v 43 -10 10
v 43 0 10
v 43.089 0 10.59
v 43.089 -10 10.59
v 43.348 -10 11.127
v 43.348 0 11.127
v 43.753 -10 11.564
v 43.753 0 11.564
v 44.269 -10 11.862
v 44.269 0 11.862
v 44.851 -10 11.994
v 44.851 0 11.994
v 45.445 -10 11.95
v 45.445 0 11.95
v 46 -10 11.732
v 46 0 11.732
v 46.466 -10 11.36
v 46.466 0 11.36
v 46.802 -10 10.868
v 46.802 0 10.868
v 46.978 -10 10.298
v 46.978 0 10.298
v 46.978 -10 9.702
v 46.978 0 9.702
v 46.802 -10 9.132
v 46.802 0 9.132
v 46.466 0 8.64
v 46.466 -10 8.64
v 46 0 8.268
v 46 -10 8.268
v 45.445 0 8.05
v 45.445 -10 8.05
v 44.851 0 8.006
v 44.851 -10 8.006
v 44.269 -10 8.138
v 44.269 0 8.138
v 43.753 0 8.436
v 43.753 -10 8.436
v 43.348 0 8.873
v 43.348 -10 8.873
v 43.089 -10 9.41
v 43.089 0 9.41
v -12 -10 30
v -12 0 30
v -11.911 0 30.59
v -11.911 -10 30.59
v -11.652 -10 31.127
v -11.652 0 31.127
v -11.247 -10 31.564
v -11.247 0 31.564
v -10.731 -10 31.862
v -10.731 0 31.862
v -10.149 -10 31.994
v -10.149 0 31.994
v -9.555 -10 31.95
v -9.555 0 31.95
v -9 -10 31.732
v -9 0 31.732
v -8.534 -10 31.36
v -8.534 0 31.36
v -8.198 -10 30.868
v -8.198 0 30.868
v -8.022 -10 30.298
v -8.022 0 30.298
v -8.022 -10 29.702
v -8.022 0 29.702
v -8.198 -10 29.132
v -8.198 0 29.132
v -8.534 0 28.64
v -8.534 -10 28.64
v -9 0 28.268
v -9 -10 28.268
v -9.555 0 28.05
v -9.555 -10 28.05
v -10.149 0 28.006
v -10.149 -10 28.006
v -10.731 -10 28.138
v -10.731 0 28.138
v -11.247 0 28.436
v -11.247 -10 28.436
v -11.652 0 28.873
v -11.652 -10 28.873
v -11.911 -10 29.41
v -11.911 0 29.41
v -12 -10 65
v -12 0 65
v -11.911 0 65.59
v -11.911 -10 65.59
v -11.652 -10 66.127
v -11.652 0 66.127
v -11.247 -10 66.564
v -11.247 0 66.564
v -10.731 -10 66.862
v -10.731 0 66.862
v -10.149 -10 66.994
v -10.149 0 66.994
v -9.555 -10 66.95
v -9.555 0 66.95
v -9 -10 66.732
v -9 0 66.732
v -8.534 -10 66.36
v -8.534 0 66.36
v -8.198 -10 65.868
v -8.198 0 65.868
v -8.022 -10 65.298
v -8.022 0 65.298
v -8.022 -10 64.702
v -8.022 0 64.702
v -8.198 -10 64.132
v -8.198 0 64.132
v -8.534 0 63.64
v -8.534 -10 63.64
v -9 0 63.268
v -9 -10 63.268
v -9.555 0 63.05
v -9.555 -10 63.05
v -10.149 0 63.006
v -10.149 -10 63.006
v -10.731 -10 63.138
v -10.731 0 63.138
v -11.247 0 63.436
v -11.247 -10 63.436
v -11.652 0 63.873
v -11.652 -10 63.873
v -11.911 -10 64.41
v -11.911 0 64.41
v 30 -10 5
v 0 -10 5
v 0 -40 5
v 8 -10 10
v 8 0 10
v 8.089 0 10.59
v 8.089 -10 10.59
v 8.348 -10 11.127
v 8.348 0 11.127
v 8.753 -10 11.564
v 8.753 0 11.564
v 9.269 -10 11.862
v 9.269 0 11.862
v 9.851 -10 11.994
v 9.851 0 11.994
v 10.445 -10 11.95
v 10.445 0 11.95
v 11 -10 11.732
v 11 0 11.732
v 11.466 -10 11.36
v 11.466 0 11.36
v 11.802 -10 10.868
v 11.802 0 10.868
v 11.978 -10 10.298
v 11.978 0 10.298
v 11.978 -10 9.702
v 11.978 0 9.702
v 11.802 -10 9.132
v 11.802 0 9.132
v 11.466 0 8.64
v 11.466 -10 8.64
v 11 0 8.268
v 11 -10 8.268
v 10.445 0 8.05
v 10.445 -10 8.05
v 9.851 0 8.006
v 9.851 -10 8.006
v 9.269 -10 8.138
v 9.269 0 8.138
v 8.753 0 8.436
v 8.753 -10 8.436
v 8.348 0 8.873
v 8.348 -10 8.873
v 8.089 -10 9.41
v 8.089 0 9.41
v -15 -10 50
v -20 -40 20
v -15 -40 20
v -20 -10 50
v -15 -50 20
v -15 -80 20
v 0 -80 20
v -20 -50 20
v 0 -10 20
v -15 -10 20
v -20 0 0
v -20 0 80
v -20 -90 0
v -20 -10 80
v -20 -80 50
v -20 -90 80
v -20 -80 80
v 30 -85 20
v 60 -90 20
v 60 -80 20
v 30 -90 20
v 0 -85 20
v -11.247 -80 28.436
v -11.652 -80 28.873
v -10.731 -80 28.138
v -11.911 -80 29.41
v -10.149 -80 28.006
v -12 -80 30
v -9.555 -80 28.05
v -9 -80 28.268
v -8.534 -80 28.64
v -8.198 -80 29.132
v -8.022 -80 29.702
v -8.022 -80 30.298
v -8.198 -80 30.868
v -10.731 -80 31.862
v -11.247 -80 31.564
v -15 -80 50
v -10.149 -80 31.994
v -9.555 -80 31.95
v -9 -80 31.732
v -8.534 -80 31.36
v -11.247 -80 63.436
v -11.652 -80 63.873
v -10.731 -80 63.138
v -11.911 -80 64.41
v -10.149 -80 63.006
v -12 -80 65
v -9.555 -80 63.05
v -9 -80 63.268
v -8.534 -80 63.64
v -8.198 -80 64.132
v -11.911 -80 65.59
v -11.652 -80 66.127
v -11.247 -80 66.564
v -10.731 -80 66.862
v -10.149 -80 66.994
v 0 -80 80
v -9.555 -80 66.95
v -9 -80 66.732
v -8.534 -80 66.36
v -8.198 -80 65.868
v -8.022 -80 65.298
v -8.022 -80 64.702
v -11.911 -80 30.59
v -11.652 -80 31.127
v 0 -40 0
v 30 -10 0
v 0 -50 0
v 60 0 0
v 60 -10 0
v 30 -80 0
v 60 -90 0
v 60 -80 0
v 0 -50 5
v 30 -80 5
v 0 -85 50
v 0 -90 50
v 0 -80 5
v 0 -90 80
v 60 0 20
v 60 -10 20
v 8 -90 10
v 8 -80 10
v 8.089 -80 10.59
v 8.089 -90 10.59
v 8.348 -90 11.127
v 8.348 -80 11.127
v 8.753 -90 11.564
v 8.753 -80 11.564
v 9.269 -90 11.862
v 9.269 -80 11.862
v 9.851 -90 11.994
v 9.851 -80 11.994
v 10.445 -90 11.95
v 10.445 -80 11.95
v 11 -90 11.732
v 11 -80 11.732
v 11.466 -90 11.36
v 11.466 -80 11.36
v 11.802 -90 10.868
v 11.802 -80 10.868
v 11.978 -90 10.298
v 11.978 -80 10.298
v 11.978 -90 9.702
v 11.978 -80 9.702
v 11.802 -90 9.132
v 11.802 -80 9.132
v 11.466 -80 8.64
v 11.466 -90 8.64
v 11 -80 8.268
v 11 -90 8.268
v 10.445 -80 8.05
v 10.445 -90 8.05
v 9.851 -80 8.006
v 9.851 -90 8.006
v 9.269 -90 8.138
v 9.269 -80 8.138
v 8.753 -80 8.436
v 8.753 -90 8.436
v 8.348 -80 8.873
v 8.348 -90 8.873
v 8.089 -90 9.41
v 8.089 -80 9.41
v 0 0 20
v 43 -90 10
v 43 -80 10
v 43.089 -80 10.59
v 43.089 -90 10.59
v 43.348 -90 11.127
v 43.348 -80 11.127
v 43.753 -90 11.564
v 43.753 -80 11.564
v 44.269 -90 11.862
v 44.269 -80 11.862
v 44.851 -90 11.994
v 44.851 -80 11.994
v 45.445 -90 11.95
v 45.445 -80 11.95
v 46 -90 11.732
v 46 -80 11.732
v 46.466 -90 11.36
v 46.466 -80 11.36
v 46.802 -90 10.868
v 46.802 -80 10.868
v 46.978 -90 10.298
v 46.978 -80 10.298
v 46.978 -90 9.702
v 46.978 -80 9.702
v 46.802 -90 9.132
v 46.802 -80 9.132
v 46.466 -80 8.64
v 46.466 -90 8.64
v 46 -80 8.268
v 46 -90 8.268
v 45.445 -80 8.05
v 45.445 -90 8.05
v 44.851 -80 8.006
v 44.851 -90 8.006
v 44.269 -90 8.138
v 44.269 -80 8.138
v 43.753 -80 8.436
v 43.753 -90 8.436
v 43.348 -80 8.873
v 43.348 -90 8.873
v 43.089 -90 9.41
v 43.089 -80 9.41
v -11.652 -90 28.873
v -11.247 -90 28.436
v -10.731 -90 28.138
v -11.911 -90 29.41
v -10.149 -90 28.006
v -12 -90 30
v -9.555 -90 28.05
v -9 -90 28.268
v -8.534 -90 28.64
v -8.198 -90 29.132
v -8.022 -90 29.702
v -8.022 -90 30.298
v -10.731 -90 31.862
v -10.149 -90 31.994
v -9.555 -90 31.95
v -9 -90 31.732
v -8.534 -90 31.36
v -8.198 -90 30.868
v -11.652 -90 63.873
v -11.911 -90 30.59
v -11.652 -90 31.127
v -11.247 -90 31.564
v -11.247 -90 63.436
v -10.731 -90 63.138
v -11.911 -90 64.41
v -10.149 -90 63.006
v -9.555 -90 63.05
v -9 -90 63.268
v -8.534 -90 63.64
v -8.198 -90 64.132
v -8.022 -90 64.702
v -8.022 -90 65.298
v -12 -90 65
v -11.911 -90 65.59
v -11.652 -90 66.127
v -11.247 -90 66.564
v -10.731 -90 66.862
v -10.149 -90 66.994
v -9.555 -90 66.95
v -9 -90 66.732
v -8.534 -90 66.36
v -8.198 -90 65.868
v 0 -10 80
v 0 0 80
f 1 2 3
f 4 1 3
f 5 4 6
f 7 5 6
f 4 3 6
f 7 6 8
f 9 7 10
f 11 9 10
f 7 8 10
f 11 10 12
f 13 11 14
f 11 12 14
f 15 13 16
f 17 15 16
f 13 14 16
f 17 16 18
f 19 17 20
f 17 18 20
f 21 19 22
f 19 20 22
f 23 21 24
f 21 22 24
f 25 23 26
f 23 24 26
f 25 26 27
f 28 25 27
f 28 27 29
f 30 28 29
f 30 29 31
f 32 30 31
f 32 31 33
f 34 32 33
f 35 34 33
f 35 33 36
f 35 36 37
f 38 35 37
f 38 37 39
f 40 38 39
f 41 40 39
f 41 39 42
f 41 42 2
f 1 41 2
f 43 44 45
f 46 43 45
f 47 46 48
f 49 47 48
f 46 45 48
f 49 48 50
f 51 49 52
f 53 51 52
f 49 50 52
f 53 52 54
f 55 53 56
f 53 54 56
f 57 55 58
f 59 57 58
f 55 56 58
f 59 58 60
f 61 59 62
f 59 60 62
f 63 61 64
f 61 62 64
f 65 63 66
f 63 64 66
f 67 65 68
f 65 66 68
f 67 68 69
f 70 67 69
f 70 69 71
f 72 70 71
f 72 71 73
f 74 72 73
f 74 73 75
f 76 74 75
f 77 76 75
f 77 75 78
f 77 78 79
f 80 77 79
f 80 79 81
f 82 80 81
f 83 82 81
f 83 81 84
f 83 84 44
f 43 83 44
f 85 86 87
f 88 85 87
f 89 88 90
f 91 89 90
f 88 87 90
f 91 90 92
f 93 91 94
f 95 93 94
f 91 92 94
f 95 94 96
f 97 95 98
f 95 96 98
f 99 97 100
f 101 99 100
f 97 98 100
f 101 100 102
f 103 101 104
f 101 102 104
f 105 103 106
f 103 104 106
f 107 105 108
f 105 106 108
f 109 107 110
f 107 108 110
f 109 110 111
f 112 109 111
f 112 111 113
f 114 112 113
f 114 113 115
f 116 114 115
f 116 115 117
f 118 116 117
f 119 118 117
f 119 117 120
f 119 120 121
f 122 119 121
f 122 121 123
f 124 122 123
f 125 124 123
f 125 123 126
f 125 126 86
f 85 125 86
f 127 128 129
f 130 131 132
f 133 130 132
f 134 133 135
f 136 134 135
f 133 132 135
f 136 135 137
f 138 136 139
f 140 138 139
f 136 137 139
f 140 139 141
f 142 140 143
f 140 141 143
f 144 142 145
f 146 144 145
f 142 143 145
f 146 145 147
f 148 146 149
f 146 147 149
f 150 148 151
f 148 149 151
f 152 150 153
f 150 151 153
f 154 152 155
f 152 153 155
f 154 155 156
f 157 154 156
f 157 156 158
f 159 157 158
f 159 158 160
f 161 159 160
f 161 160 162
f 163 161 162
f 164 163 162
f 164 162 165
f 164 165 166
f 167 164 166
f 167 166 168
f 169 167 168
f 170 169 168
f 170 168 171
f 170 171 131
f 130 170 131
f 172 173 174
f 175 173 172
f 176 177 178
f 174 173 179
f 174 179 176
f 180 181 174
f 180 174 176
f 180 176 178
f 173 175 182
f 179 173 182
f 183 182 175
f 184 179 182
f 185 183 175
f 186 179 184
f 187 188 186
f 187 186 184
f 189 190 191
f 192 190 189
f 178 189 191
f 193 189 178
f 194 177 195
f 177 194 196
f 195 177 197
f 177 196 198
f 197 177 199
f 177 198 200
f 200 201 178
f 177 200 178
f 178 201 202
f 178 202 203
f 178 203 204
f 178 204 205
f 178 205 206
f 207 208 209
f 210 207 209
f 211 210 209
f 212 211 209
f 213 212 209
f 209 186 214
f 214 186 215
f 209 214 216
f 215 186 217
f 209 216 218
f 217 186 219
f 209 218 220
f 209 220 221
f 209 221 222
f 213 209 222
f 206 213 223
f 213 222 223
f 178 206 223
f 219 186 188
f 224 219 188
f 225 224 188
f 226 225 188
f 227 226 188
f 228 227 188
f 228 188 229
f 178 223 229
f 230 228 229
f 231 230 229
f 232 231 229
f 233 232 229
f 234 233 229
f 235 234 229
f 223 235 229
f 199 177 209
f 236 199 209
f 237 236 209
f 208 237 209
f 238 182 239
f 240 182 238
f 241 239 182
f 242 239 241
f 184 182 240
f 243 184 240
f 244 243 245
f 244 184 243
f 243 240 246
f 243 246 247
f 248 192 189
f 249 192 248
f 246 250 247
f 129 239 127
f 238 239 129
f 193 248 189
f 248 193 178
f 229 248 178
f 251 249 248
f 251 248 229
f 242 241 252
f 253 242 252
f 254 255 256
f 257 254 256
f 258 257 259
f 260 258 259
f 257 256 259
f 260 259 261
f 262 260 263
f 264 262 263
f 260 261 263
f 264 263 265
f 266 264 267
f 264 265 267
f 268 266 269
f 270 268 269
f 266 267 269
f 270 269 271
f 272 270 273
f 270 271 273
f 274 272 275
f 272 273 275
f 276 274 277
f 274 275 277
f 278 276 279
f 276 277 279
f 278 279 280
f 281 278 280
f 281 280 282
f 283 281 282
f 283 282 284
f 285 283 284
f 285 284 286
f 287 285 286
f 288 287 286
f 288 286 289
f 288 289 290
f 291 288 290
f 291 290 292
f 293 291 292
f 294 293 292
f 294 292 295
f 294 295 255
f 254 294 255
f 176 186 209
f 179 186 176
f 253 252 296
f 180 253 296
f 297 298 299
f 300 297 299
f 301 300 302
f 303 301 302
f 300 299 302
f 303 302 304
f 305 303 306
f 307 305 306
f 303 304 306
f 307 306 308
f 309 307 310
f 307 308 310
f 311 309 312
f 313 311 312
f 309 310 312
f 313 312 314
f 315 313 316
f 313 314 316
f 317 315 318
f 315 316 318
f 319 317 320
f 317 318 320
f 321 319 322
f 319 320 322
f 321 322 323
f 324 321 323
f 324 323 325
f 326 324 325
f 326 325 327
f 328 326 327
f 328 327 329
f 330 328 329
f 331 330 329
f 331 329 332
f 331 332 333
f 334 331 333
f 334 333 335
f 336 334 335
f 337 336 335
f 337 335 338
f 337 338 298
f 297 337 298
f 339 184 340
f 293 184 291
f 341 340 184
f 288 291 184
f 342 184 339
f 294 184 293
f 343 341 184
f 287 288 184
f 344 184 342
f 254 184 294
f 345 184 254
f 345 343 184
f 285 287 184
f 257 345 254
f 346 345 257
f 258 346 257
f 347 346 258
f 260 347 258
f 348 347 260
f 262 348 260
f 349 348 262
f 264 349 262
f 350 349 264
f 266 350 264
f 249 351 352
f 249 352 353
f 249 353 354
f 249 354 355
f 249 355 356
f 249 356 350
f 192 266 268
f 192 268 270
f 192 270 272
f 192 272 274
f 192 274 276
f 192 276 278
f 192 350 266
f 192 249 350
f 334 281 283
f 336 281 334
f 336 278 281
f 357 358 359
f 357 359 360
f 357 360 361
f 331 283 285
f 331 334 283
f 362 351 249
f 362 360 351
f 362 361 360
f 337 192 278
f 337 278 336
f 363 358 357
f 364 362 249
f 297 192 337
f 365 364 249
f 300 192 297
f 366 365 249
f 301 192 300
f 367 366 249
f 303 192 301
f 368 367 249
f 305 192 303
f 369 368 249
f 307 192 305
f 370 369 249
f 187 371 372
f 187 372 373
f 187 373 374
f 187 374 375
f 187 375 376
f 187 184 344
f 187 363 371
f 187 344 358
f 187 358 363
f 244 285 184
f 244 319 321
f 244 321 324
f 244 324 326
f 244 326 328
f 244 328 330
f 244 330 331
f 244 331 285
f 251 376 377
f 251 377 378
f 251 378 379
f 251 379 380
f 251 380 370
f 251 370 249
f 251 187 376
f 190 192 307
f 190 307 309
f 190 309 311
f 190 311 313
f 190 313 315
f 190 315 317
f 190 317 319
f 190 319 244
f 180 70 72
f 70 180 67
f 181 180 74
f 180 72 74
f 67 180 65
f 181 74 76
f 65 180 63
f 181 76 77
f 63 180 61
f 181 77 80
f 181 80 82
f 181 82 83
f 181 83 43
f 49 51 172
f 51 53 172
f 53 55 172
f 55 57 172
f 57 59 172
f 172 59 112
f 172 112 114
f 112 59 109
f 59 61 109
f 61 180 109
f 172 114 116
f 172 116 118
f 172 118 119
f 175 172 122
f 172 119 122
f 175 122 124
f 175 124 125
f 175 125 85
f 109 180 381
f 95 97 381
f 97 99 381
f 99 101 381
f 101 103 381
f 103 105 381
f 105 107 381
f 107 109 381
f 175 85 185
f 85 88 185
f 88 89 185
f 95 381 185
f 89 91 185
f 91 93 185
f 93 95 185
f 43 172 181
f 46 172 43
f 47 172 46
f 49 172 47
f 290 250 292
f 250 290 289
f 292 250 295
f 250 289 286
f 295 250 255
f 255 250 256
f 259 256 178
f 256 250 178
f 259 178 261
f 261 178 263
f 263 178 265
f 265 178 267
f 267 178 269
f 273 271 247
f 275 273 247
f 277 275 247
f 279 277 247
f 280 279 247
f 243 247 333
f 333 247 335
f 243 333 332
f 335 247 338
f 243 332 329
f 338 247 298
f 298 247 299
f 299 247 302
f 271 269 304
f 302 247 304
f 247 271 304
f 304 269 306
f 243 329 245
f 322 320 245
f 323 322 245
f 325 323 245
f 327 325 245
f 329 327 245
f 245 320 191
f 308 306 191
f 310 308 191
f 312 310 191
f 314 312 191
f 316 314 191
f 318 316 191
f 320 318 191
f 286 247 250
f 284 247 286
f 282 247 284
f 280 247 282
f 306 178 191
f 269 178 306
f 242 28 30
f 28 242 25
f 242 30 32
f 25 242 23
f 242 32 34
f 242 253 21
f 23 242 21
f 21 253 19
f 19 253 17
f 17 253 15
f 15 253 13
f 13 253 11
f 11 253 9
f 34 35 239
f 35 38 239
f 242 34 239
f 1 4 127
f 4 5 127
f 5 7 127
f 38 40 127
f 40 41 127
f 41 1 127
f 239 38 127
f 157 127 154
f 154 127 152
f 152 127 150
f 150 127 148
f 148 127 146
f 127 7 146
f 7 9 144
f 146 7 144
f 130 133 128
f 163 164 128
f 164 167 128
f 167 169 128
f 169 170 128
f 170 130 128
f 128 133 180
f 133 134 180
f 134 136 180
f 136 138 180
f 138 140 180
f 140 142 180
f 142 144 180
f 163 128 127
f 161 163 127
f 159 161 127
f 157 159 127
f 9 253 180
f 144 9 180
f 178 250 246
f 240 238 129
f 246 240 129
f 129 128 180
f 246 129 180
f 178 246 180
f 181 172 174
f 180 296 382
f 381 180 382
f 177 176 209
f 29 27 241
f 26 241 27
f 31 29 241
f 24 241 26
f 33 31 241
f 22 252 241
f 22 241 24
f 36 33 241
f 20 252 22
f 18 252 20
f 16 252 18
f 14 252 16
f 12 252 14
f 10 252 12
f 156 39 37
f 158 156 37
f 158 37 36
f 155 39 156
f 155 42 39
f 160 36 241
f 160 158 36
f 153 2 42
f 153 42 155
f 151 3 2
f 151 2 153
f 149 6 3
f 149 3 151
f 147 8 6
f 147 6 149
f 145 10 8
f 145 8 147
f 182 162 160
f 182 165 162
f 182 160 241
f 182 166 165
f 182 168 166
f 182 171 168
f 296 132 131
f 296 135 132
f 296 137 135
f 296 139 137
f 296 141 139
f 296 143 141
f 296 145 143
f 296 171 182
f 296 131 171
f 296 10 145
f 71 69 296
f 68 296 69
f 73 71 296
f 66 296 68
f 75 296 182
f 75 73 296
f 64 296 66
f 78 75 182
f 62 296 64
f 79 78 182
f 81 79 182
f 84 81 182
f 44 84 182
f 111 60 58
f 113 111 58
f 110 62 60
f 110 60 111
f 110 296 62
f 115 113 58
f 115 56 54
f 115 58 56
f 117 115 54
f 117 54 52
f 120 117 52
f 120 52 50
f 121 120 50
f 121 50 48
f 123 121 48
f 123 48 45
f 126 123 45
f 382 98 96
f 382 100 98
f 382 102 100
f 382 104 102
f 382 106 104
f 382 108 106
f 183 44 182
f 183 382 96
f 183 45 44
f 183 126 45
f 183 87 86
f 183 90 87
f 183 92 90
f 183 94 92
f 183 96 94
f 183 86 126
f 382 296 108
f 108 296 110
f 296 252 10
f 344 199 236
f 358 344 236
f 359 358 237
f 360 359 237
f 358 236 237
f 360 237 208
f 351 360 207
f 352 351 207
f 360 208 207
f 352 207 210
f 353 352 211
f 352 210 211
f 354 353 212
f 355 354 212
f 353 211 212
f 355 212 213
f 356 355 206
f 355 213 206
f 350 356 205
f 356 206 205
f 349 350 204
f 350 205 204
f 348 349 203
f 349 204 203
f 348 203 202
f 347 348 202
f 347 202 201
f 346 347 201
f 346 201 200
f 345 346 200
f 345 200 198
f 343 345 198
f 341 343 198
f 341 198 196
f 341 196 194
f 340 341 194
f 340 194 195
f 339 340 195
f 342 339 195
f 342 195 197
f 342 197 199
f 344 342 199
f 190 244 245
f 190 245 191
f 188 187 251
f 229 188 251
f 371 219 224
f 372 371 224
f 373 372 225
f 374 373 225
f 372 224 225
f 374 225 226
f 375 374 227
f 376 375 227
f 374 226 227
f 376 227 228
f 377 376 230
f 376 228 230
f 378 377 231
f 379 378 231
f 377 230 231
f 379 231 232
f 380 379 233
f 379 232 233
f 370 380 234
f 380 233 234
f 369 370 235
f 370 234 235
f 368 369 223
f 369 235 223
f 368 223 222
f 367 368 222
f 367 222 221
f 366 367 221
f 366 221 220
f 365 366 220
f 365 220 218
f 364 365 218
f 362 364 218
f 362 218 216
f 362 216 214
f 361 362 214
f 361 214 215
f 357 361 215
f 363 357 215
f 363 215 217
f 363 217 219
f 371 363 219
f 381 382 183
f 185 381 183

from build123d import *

# Parameters (mm, degrees)
F0_W      = 20
F0_H      = 20
F1_DEPTH  = 90
F2_W      = 20
F2_H      = 20
F2_W_2    = 60
F2_H_2    = 60
F3_DEPTH  = 10
F4_W      = 20
F4_H      = 60
F4_W_2    = 60
F4_H_2    = 20
F5_DEPTH  = 10
F6_R      = 2
F7_DEPTH  = 116.7
F9_DEPTH  = 5
F11_DEPTH = 5
F13_DEPTH = 5


with BuildPart() as f1:
    # F0 (on Front) → F1 (new body)
    with BuildSketch(Plane.XZ):
        with Locations((-10, 10)):
            Rectangle(F0_W, F0_H)
    extrude(amount=F1_DEPTH)

    # F2 (on face) → F3 (join)
    with BuildSketch(Plane.XZ.offset(90)):
        with Locations((-10, 10)):
            Rectangle(F2_W, F2_H)
        with Locations((30, 10)):
            Rectangle(F2_W_2, F2_H)
        with Locations((-10, 50)):
            Rectangle(F2_W, F2_H_2)
    extrude(amount=-F3_DEPTH)

    # F4 (on face) → F5 (join)
    with BuildSketch(Plane(origin=(0, 0, 0), x_dir=(-1, 0, 0), z_dir=(0, 1, 0))):
        with Locations((10, 50)):
            Rectangle(F4_W, F4_H)
        with Locations((-30, 10)):
            Rectangle(F4_W_2, F4_H_2)
    extrude(amount=-F5_DEPTH)

    # F6 (on face) → F7 (cut)
    with BuildSketch(Plane(origin=(0, 0, 0), x_dir=(-1, 0, 0), z_dir=(0, 1, 0))):
        with Locations((10, 65)):
            Circle(F6_R)
        with Locations((10, 30)):
            Circle(F6_R)
        with Locations((-45, 10)):
            Circle(F6_R)
        with Locations((-10, 10)):
            Circle(F6_R)
    extrude(amount=-F7_DEPTH, mode=Mode.SUBTRACT)

    # F8 (on face) → F9 (join)
    with BuildSketch(Plane.XZ.offset(90)):
        Polygon((0, 50), (0, 20), (30, 20), align=None)
    extrude(amount=-F9_DEPTH)

    # F10 (on face) → F11 (join)
    with BuildSketch(Plane(origin=(0, 0, 0), x_dir=(1, 0, 0), z_dir=(0, 0, -1))):
        Polygon((30, 80), (0, 80), (0, 50), align=None)
        Polygon((0, 10), (30, 10), (0, 40), align=None)
    extrude(amount=-F11_DEPTH)

    # F12 (on face) → F13 (join)
    with BuildSketch(Plane(origin=(-20, 0, 0), x_dir=(0, -1, 0), z_dir=(-1, 0, 0))):
        Polygon((10, 50), (10, 20), (40, 20), align=None)
        Polygon((80, 20), (80, 50), (50, 20), align=None)
    extrude(amount=-F13_DEPTH)


solid = f1.part
